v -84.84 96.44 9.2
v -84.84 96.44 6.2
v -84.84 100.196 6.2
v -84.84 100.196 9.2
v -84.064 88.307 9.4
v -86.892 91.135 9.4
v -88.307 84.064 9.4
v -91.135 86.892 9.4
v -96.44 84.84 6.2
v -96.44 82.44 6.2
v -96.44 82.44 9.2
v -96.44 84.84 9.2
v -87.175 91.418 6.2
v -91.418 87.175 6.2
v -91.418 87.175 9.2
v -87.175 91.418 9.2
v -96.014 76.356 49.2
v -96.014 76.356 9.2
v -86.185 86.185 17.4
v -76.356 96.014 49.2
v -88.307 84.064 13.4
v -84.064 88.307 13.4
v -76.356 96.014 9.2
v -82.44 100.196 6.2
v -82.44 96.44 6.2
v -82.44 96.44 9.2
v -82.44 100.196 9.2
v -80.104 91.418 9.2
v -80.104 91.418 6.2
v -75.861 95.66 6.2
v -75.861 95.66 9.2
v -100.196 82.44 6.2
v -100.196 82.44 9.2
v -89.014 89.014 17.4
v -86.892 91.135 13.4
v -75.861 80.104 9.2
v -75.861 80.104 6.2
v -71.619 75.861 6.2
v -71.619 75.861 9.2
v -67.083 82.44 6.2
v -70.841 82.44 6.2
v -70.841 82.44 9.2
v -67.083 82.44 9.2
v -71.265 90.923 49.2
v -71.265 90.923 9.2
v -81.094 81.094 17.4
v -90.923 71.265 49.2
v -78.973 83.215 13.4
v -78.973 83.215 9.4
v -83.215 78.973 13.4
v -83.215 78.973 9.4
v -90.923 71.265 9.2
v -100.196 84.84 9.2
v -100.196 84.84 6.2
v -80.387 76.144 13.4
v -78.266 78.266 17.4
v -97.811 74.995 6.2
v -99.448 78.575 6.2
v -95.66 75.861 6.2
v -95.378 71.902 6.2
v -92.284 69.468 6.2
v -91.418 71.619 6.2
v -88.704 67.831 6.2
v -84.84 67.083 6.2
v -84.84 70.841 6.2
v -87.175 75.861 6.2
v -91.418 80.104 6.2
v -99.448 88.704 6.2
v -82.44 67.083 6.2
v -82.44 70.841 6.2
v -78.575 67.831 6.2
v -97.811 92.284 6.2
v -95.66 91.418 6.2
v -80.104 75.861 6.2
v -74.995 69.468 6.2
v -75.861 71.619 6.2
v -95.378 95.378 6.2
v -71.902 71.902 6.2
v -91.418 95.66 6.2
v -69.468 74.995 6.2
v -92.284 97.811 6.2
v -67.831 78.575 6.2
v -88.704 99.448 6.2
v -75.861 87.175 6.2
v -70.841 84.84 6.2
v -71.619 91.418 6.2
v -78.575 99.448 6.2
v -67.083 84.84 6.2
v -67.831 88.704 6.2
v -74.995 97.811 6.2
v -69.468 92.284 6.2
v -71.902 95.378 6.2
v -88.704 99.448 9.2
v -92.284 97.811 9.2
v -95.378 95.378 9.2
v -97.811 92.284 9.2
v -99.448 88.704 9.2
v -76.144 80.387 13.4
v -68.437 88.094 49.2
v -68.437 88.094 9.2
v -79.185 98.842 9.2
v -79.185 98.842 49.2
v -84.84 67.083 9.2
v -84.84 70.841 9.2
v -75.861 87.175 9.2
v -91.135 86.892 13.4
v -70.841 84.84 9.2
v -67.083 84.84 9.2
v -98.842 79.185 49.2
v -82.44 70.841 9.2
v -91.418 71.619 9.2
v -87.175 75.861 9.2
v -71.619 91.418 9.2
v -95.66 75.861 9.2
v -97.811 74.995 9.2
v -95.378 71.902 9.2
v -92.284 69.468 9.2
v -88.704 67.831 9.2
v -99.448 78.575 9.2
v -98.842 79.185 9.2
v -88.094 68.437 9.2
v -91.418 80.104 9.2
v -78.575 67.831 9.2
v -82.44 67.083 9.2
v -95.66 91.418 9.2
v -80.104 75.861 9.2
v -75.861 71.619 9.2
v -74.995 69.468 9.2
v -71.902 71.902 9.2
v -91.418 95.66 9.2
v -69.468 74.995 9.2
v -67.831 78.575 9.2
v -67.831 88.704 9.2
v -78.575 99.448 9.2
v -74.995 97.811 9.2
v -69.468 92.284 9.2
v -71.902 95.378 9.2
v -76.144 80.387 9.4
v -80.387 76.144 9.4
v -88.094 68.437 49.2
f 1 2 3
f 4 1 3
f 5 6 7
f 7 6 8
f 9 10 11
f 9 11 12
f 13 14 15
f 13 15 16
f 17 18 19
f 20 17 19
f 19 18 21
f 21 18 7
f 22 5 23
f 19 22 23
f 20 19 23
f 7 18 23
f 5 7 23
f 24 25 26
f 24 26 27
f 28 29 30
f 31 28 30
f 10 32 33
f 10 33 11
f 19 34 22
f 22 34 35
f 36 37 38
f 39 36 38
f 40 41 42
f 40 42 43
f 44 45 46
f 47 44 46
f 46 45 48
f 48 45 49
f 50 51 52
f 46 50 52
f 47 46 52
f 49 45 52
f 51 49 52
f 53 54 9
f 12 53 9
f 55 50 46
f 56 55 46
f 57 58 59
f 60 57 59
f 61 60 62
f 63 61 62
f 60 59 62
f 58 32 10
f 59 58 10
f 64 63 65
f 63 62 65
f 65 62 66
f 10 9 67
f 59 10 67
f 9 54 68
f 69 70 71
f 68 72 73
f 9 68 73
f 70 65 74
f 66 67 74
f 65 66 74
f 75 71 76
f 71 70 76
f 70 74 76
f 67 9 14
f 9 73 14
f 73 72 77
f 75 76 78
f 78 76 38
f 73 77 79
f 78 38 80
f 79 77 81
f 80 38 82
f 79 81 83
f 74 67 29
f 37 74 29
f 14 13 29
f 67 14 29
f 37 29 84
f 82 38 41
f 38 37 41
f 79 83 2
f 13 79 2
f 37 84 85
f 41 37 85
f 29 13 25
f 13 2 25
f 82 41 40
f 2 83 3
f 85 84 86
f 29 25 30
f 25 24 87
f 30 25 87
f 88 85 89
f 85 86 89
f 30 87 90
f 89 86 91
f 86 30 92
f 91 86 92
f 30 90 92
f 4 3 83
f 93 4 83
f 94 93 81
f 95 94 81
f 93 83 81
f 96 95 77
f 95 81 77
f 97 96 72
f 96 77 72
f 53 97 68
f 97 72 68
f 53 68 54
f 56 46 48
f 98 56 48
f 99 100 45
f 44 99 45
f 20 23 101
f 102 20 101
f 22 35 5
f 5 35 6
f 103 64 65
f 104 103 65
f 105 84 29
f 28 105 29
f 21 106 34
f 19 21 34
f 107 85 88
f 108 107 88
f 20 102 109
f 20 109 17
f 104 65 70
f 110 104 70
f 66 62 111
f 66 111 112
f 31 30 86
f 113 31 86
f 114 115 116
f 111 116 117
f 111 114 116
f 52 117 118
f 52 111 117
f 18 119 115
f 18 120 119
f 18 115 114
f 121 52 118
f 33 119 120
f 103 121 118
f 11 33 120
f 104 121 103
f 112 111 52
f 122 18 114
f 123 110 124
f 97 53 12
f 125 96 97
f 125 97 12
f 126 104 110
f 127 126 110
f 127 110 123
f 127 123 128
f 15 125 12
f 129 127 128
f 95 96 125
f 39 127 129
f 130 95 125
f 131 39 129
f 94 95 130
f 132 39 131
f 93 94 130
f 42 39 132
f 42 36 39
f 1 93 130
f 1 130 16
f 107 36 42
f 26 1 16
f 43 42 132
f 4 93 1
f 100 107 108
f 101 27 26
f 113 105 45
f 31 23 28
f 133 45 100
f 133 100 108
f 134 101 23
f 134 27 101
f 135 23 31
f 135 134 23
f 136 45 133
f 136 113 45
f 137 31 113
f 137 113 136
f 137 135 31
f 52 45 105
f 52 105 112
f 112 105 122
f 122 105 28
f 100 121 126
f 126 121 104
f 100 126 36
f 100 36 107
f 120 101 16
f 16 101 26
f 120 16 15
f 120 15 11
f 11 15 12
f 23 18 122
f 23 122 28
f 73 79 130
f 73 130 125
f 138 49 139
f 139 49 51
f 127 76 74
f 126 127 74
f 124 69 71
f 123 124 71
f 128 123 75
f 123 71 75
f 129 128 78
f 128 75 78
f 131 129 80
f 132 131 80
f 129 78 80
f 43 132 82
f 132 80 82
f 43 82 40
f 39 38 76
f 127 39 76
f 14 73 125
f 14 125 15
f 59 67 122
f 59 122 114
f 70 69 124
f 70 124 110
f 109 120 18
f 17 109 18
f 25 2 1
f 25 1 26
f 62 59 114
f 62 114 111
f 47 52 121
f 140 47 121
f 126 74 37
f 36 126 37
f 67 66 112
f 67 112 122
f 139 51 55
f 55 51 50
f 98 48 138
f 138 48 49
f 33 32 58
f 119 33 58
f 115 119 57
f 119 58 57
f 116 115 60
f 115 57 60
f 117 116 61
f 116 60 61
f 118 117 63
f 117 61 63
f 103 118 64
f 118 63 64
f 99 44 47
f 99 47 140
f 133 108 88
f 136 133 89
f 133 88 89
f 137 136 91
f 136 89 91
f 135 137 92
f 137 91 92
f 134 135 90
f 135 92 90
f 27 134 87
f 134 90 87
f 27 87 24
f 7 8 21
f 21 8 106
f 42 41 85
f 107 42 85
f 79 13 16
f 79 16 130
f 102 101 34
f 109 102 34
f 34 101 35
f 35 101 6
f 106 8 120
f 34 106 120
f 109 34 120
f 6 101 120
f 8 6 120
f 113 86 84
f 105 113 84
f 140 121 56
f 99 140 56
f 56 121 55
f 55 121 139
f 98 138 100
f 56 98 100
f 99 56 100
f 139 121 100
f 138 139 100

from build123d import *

# Parameters (mm, degrees)
SKETCH052_R     = 16.6
PAD033_DEPTH    = 3
SKETCH053_W     = 4.4
SKETCH053_H     = 2.4
SKETCH053_W_2   = 2.4
SKETCH053_H_2   = 4.4
POCKET019_DEPTH = 5
PAD034_DEPTH    = 40
POCKET020_DEPTH = 31.0155254063


with BuildPart() as part:
    # Sketch052 (on Face35 of Binder010) → Pad033 (new body)
    with BuildSketch(Plane.XY.offset(6.2)):
        with Locations((-83.6396103068, 83.6396103068)):
            Circle(SKETCH052_R)
    extrude(amount=PAD033_DEPTH)

    # Sketch053 (on Face35 of Binder010) → Pocket019 (cut)
    with BuildSketch(Plane.XY.offset(6.2)):
        Polygon((-91.4177848998, 95.660425587), (-95.660425587, 91.4177848998), (-91.4177848998, 87.1751442127), (-87.1751442127, 91.4177848998), align=None)
        Polygon((-80.1040764009, 91.4177848998), (-75.8614357137, 95.660425587), (-71.6187950266, 91.4177848998), (-75.8614357137, 87.1751442127), align=None)
        Polygon((-75.8614357137, 80.1040764009), (-71.6187950266, 75.8614357137), (-75.8614357137, 71.6187950266), (-80.1040764009, 75.8614357137), align=None)
        Polygon((-87.1751442127, 75.8614357137), (-91.4177848998, 80.1040764009), (-95.660425587, 75.8614357137), (-91.4177848998, 71.6187950266), align=None)
        with Locations((-98.6396103068, 83.6396103068)):
            Rectangle(SKETCH053_W, SKETCH053_H)
        with Locations((-83.6396103068, 68.6414357137)):
            Rectangle(SKETCH053_W_2, SKETCH053_H_2)
        with Locations((-68.6414357137, 83.6396103068)):
            Rectangle(SKETCH053_W, SKETCH053_H)
        with Locations((-83.6396103068, 98.6396103068)):
            Rectangle(SKETCH053_W_2, SKETCH053_H_2)
    extrude(amount=POCKET019_DEPTH, mode=Mode.SUBTRACT)

    # Sketch054 (on Face4 of Pocket019) → Pad034 (join)
    with BuildSketch(Plane.XY.offset(9.2)):
        Polygon((-79.1848375853, 98.8424061023), (-98.8424061023, 79.1848375853), (-96.0139789776, 76.3564104606), (-76.3564104606, 96.0139789776), align=None)
        Polygon((-71.265241636, 90.922810153), (-90.922810153, 71.265241636), (-88.0943830283, 68.4368145113), (-68.4368145113, 88.0943830283), align=None)
    extrude(amount=PAD034_DEPTH)

    # Sketch055 (on Face39 of Pad034) → Pocket020 (cut, through all)
    with BuildSketch(Plane(origin=(-89.0136218438, 89.0136218438, 0), x_dir=(-0.7071067812, -0.7071067812, 0), z_dir=(-0.7071067812, 0.7071067812, 0))):
        Polygon((-3, 9.4), (3, 9.4), (3, 13.4), (0, 17.4), (-3, 13.4), align=None)
    extrude(amount=-POCKET020_DEPTH, mode=Mode.SUBTRACT)


solid = part.part
